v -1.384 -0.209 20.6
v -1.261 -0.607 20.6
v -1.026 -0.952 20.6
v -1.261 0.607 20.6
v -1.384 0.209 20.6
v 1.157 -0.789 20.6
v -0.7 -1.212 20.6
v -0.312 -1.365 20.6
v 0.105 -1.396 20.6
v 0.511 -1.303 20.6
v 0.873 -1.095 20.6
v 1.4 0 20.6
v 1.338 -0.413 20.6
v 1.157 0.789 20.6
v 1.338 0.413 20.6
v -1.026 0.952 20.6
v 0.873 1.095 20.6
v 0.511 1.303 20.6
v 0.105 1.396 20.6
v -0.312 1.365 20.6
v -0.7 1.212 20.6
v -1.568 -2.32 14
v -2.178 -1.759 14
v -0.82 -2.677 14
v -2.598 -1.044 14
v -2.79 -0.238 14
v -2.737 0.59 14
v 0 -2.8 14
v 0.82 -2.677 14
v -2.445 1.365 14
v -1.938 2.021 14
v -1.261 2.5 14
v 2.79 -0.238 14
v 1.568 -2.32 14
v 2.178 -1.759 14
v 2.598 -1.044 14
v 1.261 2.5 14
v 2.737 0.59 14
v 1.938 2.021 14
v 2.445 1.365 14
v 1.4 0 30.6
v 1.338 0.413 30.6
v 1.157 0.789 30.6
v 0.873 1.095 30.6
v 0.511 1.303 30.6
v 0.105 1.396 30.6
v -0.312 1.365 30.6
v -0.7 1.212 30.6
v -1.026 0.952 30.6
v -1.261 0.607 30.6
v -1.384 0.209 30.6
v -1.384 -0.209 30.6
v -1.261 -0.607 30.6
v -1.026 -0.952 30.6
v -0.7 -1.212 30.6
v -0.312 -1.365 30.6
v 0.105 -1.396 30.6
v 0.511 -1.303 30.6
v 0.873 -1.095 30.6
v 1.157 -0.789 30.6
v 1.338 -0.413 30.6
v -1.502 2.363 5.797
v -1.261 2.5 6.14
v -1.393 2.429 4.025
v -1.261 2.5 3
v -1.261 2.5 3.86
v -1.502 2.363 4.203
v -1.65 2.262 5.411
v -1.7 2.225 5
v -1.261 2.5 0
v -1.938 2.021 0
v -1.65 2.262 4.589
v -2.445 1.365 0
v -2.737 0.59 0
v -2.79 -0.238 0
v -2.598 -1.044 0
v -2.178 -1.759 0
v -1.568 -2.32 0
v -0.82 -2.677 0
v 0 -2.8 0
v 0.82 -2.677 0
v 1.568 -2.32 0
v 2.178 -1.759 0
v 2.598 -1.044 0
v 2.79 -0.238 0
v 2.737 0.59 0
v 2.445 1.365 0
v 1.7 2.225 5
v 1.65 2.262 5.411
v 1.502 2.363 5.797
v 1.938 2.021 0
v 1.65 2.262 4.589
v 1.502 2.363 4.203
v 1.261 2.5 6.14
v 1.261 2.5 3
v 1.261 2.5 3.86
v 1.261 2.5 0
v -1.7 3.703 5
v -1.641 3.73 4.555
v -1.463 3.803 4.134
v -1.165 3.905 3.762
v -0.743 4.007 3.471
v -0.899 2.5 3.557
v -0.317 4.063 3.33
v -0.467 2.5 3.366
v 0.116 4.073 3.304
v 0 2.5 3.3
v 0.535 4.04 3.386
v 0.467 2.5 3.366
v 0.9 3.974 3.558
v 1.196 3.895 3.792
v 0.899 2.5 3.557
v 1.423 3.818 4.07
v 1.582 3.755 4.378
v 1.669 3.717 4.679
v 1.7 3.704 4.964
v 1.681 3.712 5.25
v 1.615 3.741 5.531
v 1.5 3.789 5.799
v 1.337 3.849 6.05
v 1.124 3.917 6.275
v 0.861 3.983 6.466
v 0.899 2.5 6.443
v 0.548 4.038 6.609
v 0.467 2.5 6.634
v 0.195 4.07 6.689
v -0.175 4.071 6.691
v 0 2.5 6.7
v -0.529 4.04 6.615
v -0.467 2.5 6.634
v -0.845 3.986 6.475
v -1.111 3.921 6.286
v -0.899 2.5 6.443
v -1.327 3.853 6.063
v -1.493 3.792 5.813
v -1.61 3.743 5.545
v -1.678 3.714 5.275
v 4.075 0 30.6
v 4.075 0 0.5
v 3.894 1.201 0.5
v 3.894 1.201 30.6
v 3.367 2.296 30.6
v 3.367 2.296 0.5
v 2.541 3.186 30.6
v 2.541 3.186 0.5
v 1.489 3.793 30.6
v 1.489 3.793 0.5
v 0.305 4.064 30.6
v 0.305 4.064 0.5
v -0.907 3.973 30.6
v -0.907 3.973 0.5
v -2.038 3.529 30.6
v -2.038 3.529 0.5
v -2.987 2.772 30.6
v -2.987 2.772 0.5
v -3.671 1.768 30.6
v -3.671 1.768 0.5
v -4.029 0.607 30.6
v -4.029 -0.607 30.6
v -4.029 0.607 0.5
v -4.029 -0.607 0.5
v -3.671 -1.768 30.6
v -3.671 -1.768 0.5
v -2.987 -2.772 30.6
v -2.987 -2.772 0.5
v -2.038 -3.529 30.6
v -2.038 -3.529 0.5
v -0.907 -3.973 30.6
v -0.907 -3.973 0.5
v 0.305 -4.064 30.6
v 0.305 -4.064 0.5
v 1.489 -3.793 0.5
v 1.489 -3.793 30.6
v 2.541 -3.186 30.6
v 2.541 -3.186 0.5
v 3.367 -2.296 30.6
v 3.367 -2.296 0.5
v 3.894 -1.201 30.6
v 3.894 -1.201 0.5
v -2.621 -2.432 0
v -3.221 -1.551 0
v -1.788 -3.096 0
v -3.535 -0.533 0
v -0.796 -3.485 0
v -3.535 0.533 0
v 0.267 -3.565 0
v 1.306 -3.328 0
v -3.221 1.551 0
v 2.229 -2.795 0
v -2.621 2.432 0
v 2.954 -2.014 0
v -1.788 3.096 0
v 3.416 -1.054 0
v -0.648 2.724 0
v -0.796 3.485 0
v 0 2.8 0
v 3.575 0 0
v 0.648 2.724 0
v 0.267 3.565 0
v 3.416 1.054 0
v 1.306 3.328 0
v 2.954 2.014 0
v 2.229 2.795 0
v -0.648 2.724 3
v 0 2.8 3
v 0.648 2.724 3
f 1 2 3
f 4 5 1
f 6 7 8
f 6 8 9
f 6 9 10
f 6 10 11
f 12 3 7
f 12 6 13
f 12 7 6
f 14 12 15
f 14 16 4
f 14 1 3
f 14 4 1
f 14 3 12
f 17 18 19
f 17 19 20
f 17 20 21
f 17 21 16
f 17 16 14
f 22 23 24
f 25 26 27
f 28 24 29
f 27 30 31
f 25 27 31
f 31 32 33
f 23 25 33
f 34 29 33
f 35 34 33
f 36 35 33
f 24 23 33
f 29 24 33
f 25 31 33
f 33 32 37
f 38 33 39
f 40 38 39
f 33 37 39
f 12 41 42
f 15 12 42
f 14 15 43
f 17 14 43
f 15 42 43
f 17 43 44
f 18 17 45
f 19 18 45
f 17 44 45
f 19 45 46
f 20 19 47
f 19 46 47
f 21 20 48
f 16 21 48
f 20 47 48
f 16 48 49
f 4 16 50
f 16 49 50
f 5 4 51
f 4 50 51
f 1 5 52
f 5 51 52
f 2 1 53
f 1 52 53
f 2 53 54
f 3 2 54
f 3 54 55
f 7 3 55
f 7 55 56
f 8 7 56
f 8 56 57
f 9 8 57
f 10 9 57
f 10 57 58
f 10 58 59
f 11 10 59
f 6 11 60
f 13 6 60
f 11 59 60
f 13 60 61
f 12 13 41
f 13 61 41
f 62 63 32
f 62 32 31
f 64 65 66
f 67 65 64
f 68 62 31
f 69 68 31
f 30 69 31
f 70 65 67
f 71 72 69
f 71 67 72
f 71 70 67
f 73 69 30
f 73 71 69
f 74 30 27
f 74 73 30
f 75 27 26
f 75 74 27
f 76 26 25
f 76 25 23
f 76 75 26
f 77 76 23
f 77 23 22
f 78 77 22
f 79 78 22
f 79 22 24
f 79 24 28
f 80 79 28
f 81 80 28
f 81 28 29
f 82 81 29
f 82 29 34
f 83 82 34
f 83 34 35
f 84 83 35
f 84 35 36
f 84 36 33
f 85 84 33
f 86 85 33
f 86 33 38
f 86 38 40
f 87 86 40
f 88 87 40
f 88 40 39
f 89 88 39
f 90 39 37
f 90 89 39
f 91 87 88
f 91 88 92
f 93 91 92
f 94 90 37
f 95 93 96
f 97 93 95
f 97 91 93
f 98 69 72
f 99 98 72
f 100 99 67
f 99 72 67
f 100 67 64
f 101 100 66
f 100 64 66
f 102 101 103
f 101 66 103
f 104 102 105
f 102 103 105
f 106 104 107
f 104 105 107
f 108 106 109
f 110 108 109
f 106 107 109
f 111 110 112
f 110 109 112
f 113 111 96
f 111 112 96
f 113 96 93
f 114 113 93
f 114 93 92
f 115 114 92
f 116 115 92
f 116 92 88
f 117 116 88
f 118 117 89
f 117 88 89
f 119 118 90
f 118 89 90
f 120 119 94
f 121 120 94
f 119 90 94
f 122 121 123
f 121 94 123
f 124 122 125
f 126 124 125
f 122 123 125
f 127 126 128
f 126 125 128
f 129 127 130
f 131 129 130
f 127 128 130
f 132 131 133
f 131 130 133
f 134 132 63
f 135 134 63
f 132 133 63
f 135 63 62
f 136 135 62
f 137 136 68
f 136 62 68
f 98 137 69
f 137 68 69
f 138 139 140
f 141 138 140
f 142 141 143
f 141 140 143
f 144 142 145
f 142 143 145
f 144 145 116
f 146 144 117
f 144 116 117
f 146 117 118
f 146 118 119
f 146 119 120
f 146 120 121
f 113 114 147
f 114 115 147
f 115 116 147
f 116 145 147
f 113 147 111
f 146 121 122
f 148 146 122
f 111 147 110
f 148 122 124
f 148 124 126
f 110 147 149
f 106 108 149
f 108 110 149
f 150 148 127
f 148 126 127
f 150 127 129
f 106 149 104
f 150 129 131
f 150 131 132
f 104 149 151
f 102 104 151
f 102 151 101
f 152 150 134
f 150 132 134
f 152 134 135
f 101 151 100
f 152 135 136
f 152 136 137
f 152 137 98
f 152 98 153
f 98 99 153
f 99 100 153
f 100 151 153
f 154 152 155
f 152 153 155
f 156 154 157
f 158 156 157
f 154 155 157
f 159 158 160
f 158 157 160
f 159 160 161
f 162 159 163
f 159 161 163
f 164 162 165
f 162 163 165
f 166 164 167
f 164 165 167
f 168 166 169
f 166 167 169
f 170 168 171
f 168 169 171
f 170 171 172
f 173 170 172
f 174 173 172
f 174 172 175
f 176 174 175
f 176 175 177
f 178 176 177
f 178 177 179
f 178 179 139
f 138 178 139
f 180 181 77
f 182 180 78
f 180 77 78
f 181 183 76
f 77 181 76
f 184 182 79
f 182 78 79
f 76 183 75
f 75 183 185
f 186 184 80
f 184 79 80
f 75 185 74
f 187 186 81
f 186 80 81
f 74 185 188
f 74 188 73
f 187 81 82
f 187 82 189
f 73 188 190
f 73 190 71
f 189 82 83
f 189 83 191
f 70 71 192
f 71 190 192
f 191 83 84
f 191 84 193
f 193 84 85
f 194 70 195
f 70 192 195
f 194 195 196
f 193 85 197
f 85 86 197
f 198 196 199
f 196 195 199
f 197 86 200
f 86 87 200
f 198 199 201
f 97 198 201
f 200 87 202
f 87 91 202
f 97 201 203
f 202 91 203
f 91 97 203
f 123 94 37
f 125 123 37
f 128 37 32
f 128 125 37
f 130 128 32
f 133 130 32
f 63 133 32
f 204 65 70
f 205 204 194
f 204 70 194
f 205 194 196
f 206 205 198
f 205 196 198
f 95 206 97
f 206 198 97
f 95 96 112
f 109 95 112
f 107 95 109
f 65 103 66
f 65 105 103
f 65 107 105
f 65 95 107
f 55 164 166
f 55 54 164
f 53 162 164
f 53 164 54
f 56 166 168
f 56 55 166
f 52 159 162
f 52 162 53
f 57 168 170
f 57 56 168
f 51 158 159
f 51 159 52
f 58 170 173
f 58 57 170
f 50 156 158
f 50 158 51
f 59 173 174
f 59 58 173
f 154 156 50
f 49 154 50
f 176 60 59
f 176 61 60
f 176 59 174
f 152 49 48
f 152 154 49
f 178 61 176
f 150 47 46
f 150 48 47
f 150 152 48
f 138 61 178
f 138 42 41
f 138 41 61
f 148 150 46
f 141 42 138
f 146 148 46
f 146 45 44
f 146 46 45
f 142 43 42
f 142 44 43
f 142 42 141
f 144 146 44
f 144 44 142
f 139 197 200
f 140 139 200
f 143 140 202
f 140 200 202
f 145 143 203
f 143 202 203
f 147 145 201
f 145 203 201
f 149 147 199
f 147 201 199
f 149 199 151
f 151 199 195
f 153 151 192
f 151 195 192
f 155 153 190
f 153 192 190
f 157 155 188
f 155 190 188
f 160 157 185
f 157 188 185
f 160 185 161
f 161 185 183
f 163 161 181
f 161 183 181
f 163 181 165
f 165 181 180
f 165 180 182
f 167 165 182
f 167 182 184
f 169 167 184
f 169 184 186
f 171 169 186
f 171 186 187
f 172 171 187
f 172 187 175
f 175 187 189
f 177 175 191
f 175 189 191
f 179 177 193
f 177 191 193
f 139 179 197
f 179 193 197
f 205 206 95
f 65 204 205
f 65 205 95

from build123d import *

# Parameters (mm, degrees)
ESQUISSE1_R             = 4.075
BOSS_EXTRU_1_DEPTH      = 30.6
ENL_V_MAT_EXTRU_1_DEPTH = 14
ESQUISSE3_R             = 2.8
ENL_V_MAT_EXTRU_2_DEPTH = 3
CHANFREIN1_SIZE         = 0.5
ESQUISSE5_R             = 1.4
ENL_V_MAT_EXTRU_4_DEPTH = 10
D_GAGEMENT_M31_D        = 3.4
D_GAGEMENT_M31_DEPTH    = 4
D_GAGEMENT_M31_TIP      = 1.021463052


with BuildPart() as part:
    # Esquisse1 → Boss.-Extru.1 (new body)
    with BuildSketch(Plane.XY):
        Circle(ESQUISSE1_R)
    extrude(amount=BOSS_EXTRU_1_DEPTH)

    # Esquisse2 → Enlèv. mat.-Extru.1 (cut)
    with BuildSketch(Plane(origin=(0, 0, 0), x_dir=(-1, 0, 0), z_dir=(0, 0, -1))):
        with BuildLine():
            Line((-1.260952021, 2.5), (1.260952021, 2.5))
            ThreePointArc((1.260952021, 2.5), (0, -2.8), (-1.260952021, 2.5))
        make_face()
    extrude(amount=-ENL_V_MAT_EXTRU_1_DEPTH, mode=Mode.SUBTRACT)

    # Esquisse3 → Enlèv. mat.-Extru.2 (cut)
    with BuildSketch(Plane(origin=(0, 0, 0), x_dir=(-1, 0, 0), z_dir=(0, 0, -1))):
        Circle(ESQUISSE3_R)
    extrude(amount=-ENL_V_MAT_EXTRU_2_DEPTH, mode=Mode.SUBTRACT)

    # Chanfrein1
    chanfrein1_edges = [part.edges().sort_by_distance(p)[0] for p in [
        (-4.075, 0, 0),
    ]]
    chamfer(chanfrein1_edges, length=CHANFREIN1_SIZE)

    # Esquisse5 → Enlèv. mat.-Extru.4 (cut)
    with BuildSketch(Plane.XY.offset(30.6)):
        Circle(ESQUISSE5_R)
    extrude(amount=-ENL_V_MAT_EXTRU_4_DEPTH, mode=Mode.SUBTRACT)

    # Dégagement M31
    with Locations(Plane(origin=(0, 4.075, 0), x_dir=(1, 0, 0), z_dir=(0, 1, 0))):
        with Locations((0, -5)):
            Hole(D_GAGEMENT_M31_D / 2, depth=D_GAGEMENT_M31_DEPTH)
            with Locations((0, 0, -(D_GAGEMENT_M31_DEPTH + D_GAGEMENT_M31_TIP / 2))):  # 118° drill point
                Cone(0, D_GAGEMENT_M31_D / 2, D_GAGEMENT_M31_TIP, mode=Mode.SUBTRACT)


solid = part.part
